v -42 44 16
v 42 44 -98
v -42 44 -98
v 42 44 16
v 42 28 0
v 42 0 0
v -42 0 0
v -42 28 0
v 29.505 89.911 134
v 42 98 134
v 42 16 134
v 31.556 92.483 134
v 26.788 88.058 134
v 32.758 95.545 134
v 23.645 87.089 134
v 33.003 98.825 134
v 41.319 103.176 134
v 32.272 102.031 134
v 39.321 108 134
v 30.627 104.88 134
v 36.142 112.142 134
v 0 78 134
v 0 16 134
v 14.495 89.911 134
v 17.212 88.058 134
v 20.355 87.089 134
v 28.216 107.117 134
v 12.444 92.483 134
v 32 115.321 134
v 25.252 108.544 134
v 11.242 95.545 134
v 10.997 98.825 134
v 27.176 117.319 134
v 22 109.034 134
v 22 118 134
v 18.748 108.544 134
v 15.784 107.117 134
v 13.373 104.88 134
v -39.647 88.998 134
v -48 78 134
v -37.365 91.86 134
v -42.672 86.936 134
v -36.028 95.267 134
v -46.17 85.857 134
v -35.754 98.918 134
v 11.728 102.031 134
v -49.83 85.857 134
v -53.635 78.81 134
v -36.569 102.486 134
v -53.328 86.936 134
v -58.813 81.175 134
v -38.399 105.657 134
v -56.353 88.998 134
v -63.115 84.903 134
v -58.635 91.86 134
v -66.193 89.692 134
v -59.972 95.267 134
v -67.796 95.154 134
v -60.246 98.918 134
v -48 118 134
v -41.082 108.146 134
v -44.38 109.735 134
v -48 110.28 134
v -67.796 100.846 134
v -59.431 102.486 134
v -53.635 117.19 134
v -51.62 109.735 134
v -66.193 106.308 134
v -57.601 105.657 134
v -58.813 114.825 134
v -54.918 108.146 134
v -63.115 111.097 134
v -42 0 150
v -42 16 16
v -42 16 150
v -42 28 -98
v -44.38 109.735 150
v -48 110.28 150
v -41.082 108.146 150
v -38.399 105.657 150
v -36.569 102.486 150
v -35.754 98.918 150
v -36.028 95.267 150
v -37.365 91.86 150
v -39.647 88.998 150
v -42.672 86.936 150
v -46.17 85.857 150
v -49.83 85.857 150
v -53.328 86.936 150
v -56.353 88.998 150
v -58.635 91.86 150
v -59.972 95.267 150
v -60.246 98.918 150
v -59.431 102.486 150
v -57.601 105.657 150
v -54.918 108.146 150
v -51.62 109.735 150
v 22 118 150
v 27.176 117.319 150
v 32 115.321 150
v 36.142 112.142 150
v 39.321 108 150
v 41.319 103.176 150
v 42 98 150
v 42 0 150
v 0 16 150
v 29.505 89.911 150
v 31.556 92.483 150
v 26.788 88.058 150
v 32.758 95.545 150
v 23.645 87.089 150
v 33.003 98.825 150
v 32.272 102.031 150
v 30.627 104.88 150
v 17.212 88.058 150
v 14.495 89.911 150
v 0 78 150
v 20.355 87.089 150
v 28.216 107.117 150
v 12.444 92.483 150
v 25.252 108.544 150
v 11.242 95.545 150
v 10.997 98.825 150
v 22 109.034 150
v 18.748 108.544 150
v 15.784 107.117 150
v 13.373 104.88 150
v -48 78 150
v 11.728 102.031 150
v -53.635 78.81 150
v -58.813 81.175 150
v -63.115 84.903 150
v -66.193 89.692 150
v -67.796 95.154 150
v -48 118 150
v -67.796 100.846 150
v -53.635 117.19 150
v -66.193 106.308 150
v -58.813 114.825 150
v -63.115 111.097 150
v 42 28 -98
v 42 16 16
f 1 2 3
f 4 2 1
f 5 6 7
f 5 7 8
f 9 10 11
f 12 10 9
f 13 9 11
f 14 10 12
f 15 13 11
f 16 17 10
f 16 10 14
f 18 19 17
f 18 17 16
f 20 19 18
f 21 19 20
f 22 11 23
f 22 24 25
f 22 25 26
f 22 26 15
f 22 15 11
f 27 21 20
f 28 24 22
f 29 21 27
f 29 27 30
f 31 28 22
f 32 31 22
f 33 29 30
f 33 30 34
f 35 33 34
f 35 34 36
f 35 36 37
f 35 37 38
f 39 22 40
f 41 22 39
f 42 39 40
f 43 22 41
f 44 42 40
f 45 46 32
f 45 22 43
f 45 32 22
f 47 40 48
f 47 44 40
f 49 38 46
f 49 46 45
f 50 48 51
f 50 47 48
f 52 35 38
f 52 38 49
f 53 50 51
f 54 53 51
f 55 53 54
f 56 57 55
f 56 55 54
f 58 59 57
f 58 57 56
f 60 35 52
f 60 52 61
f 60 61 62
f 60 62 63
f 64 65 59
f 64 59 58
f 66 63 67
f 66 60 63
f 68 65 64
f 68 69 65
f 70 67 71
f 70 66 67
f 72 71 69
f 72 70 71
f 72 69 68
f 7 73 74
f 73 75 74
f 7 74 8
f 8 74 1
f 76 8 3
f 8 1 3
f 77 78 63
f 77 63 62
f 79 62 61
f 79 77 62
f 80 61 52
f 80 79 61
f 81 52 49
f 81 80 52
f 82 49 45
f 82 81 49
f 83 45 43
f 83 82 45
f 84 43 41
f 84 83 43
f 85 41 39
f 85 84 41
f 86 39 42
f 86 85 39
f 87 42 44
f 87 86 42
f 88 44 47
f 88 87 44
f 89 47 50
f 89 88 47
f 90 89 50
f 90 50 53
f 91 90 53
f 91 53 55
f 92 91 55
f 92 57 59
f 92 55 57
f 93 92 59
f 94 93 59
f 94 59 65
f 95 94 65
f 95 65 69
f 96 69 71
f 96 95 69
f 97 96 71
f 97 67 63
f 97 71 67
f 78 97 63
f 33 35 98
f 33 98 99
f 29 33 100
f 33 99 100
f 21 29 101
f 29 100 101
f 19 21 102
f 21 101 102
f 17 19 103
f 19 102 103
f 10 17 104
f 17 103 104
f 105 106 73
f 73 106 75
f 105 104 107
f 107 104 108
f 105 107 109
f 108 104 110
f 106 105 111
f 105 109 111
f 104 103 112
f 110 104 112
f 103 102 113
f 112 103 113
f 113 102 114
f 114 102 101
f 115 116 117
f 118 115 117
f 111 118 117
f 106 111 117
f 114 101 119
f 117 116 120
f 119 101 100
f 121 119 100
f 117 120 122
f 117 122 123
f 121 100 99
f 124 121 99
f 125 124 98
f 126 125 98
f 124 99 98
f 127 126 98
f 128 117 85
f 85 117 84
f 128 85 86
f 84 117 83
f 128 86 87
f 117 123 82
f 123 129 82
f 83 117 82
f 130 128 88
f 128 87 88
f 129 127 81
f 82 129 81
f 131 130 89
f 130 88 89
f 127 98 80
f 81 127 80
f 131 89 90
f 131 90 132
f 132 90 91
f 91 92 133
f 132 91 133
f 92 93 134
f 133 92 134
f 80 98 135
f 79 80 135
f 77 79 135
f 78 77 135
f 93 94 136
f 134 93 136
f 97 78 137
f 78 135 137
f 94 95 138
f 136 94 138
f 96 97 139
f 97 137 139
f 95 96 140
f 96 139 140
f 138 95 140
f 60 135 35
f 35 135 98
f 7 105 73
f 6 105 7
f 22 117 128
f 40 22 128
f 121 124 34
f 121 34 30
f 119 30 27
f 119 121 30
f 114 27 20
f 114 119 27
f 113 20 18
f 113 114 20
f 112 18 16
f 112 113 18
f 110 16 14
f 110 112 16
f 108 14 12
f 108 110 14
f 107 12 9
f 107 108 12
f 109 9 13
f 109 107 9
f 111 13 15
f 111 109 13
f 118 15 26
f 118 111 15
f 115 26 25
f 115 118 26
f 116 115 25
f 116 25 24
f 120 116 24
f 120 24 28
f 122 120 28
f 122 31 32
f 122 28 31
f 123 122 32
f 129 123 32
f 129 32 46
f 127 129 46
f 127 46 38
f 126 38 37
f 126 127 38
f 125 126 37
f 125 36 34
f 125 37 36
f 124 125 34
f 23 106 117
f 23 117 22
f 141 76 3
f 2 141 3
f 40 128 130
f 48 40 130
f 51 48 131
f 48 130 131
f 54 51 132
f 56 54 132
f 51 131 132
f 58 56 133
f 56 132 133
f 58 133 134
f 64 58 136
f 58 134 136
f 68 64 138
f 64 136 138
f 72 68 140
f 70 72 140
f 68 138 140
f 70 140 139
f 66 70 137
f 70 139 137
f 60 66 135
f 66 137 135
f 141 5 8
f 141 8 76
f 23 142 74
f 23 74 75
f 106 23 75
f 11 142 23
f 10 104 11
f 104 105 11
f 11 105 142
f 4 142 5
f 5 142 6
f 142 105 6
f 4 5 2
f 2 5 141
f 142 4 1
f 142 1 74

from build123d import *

# Parameters (mm, degrees)
BOSS_EXTRUDE1_DEPTH     = 42
SKETCH11_W              = 42
SKETCH11_H              = 16
BOSS_EXTRUDE2_DEPTH     = 82
BOSS_EXTRUDE4_DEPTH     = 16
CUT_EXTRUDE2_DEPTH      = 270.02044532
CUT_EXTRUDE2_DEPTH_BACK = 270.02044532
SKETCH17_R              = 11.03433716
SKETCH17_R_2            = 12.280198215


with BuildPart() as part:
    # Sketch10 → Boss-Extrude1 (new, symmetric)
    with BuildSketch(Plane(origin=(0, 0, 0), x_dir=(0, 0, -1), z_dir=(1, 0, 0))):
        Polygon((-150, 0), (0, 0), (0, 28), (98, 28), (98, 44), (-16, 44), (-16, 16), (-150, 16), align=None)
    extrude(amount=BOSS_EXTRUDE1_DEPTH, both=True)

    # Sketch11 → Boss-Extrude2 (add)
    with BuildSketch(Plane(origin=(0, 16, 0), x_dir=(1, 0, 0), z_dir=(0, 1, 0))):
        with Locations((21, -142)):
            Rectangle(SKETCH11_W, SKETCH11_H)
    extrude(amount=BOSS_EXTRUDE2_DEPTH)

    # Sketch12 → Boss-Extrude4 (add)
    with BuildSketch(Plane.XY.offset(150)):
        with BuildLine():
            Line((-48, 118), (22, 118))
            ThreePointArc((22, 118), (42, 98), (22, 78))
            Line((22, 78), (-48, 78))
            ThreePointArc((-48, 78), (-68, 98), (-48, 118))
        make_face()
    extrude(amount=-BOSS_EXTRUDE4_DEPTH)

    # Sketch17 → Cut-Extrude2 (cut, two sides: drawn at the far end of the back side and taken through both)
    with BuildSketch(Plane(origin=(0, 0, 134), x_dir=(-1, 0, 0), z_dir=(0, 0, -1)).offset(-CUT_EXTRUDE2_DEPTH_BACK)):
        with Locations(Location((-22, 98, 0), (0, 0, 90))):
            Circle(SKETCH17_R)
        with Locations(Location((48, 98, 0), (0, 0, 90))):
            Circle(SKETCH17_R_2)
    extrude(amount=CUT_EXTRUDE2_DEPTH + CUT_EXTRUDE2_DEPTH_BACK, mode=Mode.SUBTRACT)


solid = part.part
